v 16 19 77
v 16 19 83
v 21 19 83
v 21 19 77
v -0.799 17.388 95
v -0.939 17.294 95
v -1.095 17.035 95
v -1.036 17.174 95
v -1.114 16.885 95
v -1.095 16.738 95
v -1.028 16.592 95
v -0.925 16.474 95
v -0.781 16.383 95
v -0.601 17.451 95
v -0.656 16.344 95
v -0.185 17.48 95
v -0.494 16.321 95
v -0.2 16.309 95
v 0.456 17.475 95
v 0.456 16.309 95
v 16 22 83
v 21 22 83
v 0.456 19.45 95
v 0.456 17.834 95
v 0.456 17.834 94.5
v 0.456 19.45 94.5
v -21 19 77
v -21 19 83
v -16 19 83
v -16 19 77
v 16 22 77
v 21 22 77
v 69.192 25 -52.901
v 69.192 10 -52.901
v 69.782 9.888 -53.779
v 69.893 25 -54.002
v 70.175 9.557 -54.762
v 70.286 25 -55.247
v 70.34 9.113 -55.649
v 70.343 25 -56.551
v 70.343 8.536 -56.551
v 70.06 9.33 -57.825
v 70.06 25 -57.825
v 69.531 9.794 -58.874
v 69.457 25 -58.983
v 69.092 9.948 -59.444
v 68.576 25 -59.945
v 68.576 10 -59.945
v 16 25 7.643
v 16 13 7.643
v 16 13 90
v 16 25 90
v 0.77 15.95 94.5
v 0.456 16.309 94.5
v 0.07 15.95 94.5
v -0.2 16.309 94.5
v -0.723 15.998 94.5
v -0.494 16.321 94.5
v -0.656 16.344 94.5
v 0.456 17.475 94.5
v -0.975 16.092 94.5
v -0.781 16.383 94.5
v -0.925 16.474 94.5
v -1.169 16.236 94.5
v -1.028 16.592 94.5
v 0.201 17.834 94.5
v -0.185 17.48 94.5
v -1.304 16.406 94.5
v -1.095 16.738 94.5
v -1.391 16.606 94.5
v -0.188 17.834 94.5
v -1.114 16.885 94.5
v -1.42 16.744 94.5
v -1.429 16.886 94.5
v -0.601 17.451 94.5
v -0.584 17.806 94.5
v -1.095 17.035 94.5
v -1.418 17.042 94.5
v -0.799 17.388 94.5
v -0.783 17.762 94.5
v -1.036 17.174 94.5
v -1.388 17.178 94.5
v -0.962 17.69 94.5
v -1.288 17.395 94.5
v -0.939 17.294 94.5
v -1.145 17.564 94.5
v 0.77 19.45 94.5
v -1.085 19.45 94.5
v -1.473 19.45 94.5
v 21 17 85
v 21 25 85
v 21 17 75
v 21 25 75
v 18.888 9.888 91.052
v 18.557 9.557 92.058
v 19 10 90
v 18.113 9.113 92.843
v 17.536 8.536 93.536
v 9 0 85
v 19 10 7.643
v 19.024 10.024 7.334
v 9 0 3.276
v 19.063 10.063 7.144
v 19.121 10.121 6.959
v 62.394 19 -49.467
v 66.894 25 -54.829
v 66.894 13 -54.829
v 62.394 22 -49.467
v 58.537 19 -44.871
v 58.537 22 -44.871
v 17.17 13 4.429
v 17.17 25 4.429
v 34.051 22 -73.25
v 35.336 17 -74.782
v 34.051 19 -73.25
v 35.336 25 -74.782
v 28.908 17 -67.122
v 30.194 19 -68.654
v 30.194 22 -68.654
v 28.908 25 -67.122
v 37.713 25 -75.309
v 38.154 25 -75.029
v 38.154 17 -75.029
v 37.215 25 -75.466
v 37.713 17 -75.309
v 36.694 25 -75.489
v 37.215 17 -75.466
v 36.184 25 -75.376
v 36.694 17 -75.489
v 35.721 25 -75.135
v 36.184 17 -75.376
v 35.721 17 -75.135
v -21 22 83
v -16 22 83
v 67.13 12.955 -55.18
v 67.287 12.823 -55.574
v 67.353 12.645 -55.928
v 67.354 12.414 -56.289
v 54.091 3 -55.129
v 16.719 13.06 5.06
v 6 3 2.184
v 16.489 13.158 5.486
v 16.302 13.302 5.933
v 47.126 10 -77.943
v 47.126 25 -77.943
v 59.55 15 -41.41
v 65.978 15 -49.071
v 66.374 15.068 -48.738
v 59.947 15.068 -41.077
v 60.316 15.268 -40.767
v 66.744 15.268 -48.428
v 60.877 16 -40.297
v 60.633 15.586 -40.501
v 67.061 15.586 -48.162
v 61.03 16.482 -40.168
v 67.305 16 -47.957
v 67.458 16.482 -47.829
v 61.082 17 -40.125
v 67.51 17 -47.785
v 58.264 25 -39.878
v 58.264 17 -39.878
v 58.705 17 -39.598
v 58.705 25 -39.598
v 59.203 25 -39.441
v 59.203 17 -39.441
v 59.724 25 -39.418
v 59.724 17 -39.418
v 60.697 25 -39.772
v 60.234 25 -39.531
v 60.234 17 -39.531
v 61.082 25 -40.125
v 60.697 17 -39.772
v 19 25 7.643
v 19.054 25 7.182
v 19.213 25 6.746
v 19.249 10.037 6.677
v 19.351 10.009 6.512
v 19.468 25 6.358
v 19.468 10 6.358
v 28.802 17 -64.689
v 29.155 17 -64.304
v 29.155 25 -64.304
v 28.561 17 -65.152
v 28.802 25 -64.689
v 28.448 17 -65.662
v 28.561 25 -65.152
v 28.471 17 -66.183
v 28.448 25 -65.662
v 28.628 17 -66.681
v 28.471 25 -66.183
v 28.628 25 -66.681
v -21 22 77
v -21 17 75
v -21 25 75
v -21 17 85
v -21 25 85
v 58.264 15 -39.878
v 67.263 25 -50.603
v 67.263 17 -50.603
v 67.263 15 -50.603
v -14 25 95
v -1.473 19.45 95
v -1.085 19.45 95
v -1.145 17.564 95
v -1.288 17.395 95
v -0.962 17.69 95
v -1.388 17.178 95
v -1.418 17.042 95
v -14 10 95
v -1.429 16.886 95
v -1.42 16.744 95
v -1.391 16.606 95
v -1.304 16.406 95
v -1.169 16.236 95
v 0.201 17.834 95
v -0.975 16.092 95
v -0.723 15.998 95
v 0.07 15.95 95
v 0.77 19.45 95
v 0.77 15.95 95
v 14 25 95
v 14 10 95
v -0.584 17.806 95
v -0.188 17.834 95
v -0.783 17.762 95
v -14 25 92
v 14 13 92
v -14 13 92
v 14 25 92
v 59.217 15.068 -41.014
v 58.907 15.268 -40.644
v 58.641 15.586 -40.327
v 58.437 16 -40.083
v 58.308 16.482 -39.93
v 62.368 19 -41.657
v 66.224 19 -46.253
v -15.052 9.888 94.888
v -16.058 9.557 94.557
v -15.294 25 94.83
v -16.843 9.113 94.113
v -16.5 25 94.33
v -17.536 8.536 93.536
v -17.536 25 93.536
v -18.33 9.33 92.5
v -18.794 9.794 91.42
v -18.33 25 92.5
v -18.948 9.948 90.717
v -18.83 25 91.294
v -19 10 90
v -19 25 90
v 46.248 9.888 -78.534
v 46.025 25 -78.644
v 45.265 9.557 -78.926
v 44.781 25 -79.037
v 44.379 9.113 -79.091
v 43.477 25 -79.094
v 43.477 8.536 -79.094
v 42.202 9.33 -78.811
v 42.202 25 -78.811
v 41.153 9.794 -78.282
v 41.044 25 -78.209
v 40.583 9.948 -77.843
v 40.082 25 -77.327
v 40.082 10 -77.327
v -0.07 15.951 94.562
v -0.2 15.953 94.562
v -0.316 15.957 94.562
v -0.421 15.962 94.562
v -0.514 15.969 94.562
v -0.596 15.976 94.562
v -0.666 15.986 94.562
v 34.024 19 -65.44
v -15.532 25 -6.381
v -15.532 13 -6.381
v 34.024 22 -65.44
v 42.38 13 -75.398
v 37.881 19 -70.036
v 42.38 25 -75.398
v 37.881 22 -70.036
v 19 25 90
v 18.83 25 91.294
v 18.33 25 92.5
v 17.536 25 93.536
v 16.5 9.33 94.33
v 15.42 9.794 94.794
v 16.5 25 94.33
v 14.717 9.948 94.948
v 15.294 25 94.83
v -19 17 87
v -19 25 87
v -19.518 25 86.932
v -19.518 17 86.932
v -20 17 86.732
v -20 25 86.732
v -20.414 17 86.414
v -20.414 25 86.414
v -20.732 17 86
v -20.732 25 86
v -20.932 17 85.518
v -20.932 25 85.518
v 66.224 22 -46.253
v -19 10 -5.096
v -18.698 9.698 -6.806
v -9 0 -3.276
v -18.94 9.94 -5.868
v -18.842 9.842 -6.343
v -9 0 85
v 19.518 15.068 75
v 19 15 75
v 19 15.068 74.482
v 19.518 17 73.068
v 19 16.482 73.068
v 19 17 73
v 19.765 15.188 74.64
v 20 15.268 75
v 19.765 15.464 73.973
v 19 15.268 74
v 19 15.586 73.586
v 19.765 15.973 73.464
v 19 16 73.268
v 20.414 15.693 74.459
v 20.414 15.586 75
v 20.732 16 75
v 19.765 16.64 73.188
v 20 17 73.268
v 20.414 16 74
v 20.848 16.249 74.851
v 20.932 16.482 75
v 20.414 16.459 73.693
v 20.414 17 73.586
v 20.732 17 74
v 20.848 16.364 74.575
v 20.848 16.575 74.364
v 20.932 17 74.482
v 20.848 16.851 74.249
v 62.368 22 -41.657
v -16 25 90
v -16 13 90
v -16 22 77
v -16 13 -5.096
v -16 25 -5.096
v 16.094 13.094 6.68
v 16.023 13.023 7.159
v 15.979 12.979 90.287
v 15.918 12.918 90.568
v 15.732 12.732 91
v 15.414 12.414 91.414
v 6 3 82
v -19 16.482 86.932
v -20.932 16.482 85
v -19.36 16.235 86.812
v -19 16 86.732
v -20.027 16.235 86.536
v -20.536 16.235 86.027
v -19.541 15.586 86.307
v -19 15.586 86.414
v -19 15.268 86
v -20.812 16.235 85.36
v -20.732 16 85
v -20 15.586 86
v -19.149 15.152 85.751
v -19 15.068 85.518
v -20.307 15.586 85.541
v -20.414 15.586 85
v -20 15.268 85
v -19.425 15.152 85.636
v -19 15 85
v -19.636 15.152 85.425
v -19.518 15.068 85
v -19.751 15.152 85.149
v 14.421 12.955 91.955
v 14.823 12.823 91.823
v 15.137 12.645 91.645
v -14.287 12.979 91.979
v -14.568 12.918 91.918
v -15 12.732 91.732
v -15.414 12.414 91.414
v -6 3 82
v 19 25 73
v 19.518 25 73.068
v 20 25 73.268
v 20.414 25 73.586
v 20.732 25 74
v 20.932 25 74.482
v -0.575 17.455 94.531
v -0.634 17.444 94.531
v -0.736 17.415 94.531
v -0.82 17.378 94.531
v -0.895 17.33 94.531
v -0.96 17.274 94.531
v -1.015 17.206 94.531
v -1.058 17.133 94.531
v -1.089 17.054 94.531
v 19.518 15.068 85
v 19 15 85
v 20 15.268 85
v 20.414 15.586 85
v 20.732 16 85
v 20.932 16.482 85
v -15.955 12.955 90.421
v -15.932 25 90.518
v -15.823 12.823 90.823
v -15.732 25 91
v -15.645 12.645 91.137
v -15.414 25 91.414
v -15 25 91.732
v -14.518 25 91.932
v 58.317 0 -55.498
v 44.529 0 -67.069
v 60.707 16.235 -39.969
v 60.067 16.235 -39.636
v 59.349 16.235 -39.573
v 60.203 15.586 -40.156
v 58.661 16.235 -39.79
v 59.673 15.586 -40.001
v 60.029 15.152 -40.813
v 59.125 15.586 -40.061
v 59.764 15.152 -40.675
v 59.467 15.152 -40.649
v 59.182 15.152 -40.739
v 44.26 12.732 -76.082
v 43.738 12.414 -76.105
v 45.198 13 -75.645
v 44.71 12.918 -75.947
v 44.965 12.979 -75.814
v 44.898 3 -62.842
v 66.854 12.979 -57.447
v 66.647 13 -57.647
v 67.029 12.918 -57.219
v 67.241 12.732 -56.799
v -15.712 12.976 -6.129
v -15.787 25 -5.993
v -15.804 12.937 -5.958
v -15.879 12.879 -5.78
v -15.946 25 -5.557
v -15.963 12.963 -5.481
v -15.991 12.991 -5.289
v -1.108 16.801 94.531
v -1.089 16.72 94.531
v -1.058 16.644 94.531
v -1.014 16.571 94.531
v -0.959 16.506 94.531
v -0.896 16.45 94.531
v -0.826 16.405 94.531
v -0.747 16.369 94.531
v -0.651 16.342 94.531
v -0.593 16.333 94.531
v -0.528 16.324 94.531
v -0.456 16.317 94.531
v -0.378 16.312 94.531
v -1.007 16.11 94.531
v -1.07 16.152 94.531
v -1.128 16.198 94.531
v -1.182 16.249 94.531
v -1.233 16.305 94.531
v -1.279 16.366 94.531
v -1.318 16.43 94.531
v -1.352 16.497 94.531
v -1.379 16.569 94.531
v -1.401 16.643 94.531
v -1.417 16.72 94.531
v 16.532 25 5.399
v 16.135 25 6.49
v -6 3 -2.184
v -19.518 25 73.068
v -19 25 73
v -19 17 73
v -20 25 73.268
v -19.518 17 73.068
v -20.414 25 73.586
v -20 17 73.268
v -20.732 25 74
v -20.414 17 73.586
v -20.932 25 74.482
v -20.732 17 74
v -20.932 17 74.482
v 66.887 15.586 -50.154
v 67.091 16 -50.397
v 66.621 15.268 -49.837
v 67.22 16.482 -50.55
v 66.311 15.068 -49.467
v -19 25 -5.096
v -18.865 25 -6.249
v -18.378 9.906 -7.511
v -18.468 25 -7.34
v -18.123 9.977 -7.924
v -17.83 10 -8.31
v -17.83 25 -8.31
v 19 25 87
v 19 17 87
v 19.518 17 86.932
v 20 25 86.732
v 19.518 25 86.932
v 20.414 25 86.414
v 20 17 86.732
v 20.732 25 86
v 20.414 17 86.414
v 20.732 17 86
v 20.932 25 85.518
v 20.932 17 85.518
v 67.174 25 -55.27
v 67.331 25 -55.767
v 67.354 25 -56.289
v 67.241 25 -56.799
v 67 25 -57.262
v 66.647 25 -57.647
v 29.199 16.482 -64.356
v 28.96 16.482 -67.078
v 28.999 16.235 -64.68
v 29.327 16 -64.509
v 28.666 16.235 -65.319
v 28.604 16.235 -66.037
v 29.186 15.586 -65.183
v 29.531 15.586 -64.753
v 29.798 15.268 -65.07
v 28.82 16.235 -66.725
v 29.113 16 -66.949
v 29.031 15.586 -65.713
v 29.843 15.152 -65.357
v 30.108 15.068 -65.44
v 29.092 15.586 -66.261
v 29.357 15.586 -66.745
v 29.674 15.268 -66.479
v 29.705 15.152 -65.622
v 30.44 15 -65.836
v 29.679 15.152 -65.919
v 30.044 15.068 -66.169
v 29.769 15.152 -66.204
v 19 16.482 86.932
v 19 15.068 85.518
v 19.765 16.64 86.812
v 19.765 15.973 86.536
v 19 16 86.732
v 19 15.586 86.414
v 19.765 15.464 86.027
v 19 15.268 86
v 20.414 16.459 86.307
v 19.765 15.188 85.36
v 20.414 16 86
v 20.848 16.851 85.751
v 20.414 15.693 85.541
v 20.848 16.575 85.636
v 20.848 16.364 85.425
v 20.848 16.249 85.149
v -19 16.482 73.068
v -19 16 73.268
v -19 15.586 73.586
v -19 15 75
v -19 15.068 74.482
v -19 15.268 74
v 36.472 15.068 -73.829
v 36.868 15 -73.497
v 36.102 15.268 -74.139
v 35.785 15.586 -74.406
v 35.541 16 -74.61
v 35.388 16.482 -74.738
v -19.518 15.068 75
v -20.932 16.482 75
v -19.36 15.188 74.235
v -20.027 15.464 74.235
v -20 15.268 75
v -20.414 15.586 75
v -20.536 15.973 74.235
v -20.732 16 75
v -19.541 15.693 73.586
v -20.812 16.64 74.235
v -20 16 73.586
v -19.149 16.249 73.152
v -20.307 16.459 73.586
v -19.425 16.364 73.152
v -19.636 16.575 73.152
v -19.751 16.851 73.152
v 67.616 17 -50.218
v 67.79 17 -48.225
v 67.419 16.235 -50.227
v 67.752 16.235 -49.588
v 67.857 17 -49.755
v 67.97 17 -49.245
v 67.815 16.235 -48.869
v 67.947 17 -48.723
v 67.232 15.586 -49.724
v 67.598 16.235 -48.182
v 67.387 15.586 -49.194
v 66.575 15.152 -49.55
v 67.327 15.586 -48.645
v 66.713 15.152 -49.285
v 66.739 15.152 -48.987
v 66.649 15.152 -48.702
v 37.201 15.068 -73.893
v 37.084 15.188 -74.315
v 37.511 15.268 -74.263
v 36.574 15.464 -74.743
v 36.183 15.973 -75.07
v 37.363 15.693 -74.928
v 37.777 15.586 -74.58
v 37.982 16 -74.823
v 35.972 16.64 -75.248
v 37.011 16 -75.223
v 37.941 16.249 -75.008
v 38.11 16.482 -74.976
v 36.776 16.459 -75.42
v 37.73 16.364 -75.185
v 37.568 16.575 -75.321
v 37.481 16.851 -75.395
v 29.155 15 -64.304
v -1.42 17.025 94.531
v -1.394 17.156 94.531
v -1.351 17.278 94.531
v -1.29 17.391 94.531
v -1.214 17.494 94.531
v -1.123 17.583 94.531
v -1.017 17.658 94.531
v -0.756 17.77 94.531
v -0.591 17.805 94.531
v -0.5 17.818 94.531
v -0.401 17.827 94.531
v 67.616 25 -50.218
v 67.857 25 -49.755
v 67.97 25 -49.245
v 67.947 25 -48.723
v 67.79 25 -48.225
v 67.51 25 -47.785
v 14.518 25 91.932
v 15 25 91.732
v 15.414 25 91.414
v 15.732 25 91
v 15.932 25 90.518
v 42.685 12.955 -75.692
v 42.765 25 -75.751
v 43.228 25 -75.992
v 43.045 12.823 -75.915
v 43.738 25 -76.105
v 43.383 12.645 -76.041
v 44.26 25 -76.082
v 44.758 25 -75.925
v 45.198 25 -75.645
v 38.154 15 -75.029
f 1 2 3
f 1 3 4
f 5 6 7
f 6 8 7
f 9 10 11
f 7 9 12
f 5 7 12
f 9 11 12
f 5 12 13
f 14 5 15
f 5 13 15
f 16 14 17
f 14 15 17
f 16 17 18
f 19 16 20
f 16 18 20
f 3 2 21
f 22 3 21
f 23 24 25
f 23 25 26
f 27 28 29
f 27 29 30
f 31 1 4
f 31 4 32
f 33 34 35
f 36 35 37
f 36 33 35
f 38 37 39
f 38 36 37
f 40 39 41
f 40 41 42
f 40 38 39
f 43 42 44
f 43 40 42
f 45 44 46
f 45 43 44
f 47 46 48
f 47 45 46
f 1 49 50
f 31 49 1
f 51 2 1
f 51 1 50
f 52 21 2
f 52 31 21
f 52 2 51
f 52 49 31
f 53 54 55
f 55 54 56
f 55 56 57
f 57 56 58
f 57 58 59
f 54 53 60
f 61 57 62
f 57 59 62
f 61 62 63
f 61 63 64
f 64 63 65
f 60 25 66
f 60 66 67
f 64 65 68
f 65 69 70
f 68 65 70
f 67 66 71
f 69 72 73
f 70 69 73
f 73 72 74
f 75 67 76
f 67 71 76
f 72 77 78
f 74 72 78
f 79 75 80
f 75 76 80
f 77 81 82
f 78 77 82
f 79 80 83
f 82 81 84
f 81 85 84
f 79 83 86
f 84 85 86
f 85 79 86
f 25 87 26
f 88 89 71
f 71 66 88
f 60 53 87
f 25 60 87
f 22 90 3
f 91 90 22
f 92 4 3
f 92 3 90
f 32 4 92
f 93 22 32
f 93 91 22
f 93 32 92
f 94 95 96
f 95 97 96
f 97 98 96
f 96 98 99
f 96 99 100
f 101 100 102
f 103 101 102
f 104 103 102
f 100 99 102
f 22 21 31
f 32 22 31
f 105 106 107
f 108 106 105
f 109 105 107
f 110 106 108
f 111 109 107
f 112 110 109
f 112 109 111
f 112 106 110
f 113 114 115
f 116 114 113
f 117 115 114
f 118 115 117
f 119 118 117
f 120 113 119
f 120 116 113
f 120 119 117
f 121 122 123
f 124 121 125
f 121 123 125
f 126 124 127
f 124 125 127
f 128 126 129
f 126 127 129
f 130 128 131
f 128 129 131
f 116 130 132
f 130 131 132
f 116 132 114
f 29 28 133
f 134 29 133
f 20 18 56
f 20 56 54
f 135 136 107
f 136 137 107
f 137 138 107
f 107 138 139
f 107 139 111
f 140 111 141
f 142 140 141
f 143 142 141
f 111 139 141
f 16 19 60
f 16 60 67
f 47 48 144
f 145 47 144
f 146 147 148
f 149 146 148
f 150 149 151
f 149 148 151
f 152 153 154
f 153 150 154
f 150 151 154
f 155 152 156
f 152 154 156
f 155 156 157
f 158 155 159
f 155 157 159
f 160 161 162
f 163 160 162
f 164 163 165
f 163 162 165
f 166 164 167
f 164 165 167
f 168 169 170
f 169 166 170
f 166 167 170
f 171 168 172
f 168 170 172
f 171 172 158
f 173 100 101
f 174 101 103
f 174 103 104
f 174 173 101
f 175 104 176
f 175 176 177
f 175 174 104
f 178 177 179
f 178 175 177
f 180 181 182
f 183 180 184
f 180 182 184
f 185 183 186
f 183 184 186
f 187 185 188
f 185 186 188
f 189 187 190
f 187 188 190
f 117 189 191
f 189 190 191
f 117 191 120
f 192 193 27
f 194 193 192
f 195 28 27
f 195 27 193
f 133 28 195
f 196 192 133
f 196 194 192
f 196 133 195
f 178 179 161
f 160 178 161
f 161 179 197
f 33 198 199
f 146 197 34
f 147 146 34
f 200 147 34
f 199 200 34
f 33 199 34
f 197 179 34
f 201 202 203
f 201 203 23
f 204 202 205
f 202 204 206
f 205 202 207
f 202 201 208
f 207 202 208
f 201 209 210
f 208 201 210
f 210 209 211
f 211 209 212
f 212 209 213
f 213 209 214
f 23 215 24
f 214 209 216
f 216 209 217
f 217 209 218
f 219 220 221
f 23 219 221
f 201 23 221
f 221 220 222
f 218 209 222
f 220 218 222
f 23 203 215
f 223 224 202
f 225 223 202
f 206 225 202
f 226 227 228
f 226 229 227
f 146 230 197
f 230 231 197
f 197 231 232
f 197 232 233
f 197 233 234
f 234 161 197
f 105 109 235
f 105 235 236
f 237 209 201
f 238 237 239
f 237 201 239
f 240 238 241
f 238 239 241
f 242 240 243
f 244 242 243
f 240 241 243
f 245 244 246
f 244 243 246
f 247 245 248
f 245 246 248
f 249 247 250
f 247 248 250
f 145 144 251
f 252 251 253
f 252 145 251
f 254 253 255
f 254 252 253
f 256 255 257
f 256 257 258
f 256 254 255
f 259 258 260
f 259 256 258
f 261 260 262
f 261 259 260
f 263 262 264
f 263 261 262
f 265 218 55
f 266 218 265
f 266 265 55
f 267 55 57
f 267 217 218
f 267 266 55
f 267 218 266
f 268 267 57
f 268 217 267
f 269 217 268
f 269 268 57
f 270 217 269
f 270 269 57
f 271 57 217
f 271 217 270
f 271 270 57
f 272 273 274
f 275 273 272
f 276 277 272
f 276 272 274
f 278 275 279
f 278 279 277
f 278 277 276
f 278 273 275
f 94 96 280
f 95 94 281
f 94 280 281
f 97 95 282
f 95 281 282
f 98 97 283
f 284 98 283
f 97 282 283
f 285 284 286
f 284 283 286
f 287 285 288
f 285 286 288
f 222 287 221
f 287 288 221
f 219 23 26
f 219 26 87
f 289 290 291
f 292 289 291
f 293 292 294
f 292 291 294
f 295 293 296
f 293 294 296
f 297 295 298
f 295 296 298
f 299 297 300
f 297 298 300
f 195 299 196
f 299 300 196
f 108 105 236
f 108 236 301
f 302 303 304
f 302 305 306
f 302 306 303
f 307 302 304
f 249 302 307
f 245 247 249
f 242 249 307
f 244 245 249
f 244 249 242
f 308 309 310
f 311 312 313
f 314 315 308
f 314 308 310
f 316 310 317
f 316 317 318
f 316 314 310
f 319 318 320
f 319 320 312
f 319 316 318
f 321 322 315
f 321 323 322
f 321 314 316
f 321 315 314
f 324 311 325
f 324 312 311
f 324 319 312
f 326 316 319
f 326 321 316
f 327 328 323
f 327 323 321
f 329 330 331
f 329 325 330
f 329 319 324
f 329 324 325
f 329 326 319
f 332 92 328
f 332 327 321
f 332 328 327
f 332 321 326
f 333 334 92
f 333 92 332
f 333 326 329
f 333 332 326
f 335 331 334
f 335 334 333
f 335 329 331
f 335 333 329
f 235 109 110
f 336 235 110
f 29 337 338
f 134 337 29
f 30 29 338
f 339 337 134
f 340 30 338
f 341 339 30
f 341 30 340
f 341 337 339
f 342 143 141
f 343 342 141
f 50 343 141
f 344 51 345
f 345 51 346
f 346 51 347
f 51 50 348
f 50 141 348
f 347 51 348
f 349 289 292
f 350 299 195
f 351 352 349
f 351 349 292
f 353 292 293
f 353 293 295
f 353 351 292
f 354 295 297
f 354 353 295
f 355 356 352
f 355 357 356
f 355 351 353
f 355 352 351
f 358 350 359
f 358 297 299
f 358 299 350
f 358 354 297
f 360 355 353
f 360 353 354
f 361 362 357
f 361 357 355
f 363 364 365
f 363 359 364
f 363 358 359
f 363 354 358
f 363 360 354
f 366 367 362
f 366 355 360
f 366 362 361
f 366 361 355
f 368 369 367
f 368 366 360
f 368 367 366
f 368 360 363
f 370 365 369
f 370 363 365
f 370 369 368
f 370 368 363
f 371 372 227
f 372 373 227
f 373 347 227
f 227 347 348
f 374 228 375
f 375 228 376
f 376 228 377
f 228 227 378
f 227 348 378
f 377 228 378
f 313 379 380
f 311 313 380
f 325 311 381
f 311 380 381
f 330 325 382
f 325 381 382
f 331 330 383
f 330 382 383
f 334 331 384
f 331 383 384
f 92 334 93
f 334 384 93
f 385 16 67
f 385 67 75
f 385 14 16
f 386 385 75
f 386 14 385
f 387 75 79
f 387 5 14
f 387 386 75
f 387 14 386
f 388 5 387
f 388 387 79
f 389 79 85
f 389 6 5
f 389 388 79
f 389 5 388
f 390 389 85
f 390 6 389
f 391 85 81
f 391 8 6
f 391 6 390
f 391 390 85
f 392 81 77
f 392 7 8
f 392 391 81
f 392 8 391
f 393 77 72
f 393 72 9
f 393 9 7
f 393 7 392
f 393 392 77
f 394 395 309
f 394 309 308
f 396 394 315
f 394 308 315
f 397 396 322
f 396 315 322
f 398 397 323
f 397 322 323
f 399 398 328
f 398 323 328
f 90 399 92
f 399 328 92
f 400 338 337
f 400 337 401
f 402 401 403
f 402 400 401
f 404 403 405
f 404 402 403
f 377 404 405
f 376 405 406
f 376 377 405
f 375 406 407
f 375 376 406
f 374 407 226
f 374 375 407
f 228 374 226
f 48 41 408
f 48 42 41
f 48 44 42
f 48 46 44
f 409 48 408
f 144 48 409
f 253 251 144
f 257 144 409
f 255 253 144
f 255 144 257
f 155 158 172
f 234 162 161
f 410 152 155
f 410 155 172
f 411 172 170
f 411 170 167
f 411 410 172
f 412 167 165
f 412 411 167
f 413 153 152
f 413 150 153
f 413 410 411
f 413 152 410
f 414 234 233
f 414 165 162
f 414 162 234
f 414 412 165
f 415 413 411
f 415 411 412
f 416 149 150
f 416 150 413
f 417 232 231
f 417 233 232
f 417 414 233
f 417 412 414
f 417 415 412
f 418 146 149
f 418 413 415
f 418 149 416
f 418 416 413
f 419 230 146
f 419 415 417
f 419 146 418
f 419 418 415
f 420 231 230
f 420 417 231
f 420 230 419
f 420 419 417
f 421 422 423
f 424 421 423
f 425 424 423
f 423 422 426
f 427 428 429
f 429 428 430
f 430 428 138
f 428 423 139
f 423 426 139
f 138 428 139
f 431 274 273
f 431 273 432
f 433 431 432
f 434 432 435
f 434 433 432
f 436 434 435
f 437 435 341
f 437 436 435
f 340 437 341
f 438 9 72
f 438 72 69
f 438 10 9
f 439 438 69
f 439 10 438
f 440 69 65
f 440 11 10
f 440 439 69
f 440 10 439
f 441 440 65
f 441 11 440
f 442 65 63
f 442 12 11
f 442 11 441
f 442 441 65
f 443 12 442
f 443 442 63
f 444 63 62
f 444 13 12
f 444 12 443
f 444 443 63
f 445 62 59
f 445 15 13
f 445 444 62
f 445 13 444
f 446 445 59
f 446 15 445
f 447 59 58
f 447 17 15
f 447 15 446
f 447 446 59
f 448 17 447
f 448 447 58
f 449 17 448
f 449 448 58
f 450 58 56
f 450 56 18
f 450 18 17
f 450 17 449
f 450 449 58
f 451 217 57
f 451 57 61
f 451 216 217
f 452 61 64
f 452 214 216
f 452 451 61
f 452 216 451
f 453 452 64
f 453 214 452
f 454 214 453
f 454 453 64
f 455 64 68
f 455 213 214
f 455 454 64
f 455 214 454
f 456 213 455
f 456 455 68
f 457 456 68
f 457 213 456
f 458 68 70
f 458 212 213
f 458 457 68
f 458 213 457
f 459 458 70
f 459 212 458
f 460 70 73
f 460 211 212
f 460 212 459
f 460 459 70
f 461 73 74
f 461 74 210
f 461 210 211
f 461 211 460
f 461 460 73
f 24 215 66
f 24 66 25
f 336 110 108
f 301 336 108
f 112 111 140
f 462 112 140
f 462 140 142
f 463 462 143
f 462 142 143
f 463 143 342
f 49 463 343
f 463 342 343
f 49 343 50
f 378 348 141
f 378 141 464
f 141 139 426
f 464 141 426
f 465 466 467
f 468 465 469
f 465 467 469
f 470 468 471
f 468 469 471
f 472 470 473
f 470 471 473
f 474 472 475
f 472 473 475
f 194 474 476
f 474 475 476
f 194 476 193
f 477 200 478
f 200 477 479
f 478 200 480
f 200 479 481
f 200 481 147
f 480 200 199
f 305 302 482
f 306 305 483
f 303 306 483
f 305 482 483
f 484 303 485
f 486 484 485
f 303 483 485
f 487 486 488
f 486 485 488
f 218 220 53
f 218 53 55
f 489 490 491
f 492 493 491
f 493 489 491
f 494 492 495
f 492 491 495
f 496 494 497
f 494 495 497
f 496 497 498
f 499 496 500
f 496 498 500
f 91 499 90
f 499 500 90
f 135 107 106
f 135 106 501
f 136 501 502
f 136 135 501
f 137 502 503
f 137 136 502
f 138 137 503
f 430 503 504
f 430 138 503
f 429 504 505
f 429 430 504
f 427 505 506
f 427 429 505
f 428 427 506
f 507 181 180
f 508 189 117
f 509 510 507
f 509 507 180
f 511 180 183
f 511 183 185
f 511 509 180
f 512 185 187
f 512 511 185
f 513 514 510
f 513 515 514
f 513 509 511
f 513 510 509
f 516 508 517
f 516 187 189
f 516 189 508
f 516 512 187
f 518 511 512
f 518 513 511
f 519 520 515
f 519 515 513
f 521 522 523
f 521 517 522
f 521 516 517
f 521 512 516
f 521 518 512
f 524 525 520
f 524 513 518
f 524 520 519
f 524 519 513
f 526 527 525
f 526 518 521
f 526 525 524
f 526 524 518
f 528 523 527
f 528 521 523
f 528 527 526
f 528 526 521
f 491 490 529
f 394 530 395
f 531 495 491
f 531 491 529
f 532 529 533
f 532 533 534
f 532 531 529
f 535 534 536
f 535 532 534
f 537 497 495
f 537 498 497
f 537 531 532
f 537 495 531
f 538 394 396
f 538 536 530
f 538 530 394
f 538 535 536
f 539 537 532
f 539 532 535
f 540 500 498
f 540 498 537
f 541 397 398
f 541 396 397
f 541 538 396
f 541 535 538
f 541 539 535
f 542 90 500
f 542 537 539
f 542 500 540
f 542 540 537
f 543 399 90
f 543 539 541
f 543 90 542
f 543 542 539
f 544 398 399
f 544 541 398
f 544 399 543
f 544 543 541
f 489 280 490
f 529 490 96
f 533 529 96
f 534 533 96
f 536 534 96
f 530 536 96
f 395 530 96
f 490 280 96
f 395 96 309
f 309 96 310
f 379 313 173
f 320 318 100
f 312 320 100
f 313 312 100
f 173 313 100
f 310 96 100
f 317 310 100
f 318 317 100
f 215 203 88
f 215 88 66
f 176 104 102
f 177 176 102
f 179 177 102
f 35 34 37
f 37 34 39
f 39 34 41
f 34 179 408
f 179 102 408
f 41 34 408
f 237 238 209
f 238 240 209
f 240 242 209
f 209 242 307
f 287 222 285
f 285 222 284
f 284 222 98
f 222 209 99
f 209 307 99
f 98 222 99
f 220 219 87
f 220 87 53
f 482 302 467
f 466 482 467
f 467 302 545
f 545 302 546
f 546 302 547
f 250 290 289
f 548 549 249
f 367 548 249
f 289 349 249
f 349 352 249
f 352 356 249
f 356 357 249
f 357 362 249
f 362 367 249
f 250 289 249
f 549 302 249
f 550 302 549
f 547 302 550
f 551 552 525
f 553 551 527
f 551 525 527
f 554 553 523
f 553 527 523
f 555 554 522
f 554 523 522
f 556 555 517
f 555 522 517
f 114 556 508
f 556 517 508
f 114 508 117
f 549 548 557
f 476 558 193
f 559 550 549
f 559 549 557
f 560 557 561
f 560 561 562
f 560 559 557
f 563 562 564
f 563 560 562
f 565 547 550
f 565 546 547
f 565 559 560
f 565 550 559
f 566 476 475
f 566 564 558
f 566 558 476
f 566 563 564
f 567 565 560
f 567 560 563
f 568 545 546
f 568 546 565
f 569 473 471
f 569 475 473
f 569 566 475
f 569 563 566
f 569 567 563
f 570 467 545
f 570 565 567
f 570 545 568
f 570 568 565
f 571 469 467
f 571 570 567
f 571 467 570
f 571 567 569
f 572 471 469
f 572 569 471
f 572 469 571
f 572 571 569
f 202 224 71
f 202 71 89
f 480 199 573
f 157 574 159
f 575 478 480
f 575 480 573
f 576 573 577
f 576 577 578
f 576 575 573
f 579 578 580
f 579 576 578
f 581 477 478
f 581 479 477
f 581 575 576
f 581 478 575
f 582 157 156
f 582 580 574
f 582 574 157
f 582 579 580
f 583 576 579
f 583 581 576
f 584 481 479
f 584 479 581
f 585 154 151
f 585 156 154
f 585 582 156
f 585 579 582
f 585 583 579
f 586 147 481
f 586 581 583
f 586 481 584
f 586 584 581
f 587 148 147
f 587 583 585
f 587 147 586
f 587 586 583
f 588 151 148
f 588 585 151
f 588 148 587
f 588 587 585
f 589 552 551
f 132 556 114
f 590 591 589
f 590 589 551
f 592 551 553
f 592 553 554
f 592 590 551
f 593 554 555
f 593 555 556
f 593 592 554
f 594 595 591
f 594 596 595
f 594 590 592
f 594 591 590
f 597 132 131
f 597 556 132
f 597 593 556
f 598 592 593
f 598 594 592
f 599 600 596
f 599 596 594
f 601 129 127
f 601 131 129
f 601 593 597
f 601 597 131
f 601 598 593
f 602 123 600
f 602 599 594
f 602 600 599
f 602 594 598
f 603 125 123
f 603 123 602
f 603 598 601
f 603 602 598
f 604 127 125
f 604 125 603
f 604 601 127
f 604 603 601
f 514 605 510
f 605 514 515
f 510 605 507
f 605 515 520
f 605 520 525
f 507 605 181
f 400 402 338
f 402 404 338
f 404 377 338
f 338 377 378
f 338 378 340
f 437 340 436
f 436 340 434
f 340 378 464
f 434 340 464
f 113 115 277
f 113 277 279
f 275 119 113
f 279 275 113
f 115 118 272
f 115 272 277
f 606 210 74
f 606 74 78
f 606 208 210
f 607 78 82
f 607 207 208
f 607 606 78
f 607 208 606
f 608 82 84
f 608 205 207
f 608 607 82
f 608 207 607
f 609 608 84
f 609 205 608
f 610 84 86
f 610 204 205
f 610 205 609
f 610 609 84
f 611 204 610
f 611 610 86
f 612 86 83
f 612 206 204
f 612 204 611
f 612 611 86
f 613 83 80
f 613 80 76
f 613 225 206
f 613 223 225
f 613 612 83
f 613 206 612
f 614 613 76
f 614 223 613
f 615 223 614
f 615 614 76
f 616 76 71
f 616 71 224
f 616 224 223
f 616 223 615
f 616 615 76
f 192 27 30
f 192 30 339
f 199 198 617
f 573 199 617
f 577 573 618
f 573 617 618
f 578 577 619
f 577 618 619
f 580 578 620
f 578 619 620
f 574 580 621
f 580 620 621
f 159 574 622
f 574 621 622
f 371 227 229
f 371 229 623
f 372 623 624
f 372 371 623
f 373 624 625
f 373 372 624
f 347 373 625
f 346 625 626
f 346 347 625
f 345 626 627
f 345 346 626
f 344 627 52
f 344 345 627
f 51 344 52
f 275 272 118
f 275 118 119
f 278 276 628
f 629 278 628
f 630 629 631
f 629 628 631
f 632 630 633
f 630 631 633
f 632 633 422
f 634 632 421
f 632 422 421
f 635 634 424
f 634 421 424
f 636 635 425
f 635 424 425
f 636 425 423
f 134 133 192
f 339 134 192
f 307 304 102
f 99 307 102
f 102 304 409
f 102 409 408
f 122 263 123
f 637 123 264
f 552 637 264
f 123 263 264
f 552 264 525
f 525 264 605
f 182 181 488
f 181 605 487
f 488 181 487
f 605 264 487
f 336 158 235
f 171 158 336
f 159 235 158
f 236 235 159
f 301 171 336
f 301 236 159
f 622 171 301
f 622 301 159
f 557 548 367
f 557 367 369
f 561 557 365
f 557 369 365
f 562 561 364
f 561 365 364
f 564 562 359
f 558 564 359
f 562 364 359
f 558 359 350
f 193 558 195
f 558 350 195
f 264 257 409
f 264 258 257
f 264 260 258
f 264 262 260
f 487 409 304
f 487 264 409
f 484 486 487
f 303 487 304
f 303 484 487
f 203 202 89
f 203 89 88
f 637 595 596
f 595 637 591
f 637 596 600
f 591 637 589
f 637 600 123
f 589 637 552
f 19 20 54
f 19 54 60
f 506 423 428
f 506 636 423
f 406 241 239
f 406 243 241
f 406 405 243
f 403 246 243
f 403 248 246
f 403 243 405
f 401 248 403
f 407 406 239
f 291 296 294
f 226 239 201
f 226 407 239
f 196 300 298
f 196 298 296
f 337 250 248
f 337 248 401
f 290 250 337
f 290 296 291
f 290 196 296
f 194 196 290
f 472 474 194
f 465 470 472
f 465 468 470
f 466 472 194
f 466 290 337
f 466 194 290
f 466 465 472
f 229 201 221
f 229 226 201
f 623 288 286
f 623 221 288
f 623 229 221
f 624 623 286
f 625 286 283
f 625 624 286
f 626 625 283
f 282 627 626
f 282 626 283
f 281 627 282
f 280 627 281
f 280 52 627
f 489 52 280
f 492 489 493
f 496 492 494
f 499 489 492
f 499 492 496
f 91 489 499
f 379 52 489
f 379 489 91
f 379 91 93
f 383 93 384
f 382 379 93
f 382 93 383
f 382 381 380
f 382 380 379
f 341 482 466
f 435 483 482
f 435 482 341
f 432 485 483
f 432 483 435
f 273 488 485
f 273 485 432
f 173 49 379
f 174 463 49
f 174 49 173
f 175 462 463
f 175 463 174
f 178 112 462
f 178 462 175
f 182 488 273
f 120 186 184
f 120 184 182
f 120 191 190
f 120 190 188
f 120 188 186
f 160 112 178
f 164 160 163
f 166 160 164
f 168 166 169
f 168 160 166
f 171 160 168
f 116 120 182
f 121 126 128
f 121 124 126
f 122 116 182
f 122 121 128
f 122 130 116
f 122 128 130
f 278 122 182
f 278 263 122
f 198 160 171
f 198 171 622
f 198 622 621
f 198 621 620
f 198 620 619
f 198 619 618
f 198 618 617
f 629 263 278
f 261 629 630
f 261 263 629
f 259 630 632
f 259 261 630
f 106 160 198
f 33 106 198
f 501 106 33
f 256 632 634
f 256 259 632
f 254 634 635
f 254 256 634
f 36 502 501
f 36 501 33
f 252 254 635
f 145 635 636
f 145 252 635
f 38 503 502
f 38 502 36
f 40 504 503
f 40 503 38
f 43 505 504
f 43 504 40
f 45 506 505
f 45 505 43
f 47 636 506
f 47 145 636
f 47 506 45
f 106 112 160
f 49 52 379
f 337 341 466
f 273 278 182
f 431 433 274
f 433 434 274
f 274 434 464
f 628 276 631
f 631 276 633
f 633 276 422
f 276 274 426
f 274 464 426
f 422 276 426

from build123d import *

# Parameters (mm, degrees)
BOSS_EXTRUDE1_DEPTH     = 25
CUT_EXTRUDE1_DEPTH      = 22
CHAMFER1_SIZE           = 10
FILLET1_R               = 2
FILLET2_R               = 5
SKETCH3_W               = 14
SKETCH3_H               = 10
BOSS_EXTRUDE2_DEPTH     = 2
SKETCH4_W               = 14
SKETCH4_H               = 10
BOSS_EXTRUDE3_DEPTH     = 2
CUT_EXTRUDE2_DEPTH      = 111.216138206
CUT_EXTRUDE2_DEPTH_BACK = 111.216138206
SKETCH5_W               = 6
SKETCH5_H               = 3
SKETCH6_W               = 14
SKETCH6_H               = 10
BOSS_EXTRUDE4_DEPTH     = 2
SKETCH7_W               = 14
SKETCH7_H               = 10
BOSS_EXTRUDE5_DEPTH     = 2
CUT_EXTRUDE3_DEPTH      = 110.938912569
CUT_EXTRUDE3_DEPTH_BACK = 110.938912569
SKETCH8_W               = 6
SKETCH8_H               = 3
FILLET4_R               = 2
CUT_EXTRUDE4_DEPTH      = 0.5


with BuildPart() as part:
    # Sketch1 → Boss-Extrude1 (new body)
    with BuildSketch(Plane(origin=(0, 0, 0), x_dir=(1, 0, 0), z_dir=(0, 1, 0))):
        Polygon((19, -95), (19, -6.915434451), (72.405729291, 56.731035297), (43.296040453, 81.156964465), (-19, 6.915434451), (-19, -95), align=None)
    extrude(amount=BOSS_EXTRUDE1_DEPTH)

    # Sketch2 → Cut-Extrude1 (cut)
    with BuildSketch(Plane(origin=(0, 25, 0), x_dir=(1, 0, 0), z_dir=(0, 1, 0))):
        Polygon((43.665810953, 76.930468306), (68.179233133, 56.361264796), (16, -5.823523748), (16, -92), (-16, -92), (-16, 5.823523748), align=None)
    extrude(amount=-CUT_EXTRUDE1_DEPTH, mode=Mode.SUBTRACT)

    # Chamfer1
    chamfer1_edges = [part.edges().sort_by_distance(p)[0] for p in [
        (13.832905476, 3, -41.376996027),
        (55.922522043, 3, -66.645866551),
        (42.089616566, 3, -25.268870524),
        (16, 3, 48.911761874),
        (0, 3, 92),
        (-16, 3, 43.088238126),
        (-19, 0, 44.042282774),
        (12.148020226, 0, -44.036199458),
        (57.850884872, 0, -68.943999881),
        (45.702864646, 0, -24.907800423),
        (19, 0, 50.957717226),
        (0, 0, 95),
    ]]
    chamfer(chamfer1_edges, length=CHAMFER1_SIZE)

    # Fillet1
    fillet1_edges = [part.edges().sort_by_distance(p)[0] for p in [
        (19, 17.5, 6.915434451),
        (43.665810953, 19, -76.930468306),
        (68.179233133, 19, -56.361264796),
        (16, 19, 92),
        (-16, 19, 92),
        (-16, 19, -5.823523748),
    ]]
    fillet(fillet1_edges, radius=FILLET1_R)

    # Fillet2
    fillet2_edges = [part.edges().sort_by_distance(p)[0] for p in [
        (-19, 17.5, 95),
        (-19, 17.5, -6.915434451),
        (43.296040453, 17.5, -81.156964465),
        (72.405729291, 17.5, -56.731035297),
        (19, 17.5, 95),
        (16, 19, 5.823523748),
    ]]
    fillet(fillet2_edges, radius=FILLET2_R)

    # Sketch3 → Boss-Extrude2 (add)
    with BuildSketch(Plane(origin=(-14.554844419, 0, -12.212964584), x_dir=(-0.6427876096865406, 0, 0.7660444431189771), z_dir=(-0.766044443118977, 0, -0.6427876096865405))):
        with Locations((-75, 20)):
            Rectangle(SKETCH3_W, SKETCH3_H)
    extrude(amount=BOSS_EXTRUDE2_DEPTH)

    # Sketch4 → Boss-Extrude3 (add)
    with BuildSketch(Plane(origin=(14.554844419, 0, 12.212964584), x_dir=(0.6427876096865404, 0, -0.7660444431189771), z_dir=(0.7660444431189771, 0, 0.6427876096865404))):
        with Locations((75, 20)):
            Rectangle(SKETCH4_W, SKETCH4_H)
    extrude(amount=BOSS_EXTRUDE3_DEPTH)

    # Sketch5 → Cut-Extrude2 (cut, two sides: drawn at the far end of the back side and taken through both)
    with BuildSketch(Plane(origin=(16.086933305, 0, 13.498539803), x_dir=(0.64278760968654, 0, -0.7660444431189776), z_dir=(0.7660444431189775, 0, 0.6427876096865399)).offset(-CUT_EXTRUDE2_DEPTH_BACK)):
        with Locations((75, 20.5)):
            Rectangle(SKETCH5_W, SKETCH5_H)
    extrude(amount=CUT_EXTRUDE2_DEPTH + CUT_EXTRUDE2_DEPTH_BACK, mode=Mode.SUBTRACT)

    # Sketch6 → Boss-Extrude4 (add)
    with BuildSketch(Plane.ZY.offset(19)):
        with Locations((80, 20)):
            Rectangle(SKETCH6_W, SKETCH6_H)
    extrude(amount=BOSS_EXTRUDE4_DEPTH)

    # Sketch7 → Boss-Extrude5 (add)
    with BuildSketch(Plane(origin=(19, 0, 0), x_dir=(0, 0, -1), z_dir=(1, 0, 0))):
        with Locations((-80, 20)):
            Rectangle(SKETCH7_W, SKETCH7_H)
    extrude(amount=BOSS_EXTRUDE5_DEPTH)

    # Sketch8 → Cut-Extrude3 (cut, two sides: drawn at the far end of the back side and taken through both)
    with BuildSketch(Plane(origin=(21, 0, 0), x_dir=(0, 0, -1), z_dir=(1, 0, 0)).offset(-CUT_EXTRUDE3_DEPTH_BACK)):
        with Locations((-80, 20.5)):
            Rectangle(SKETCH8_W, SKETCH8_H)
    extrude(amount=CUT_EXTRUDE3_DEPTH + CUT_EXTRUDE3_DEPTH_BACK, mode=Mode.SUBTRACT)

    # Fillet4
    # the kernel refuses this fillet: 2 mm, written as the material it takes off along each edge
    with BuildSketch(Plane(origin=(36.868164356, 17, -73.496520034), x_dir=(-0.7660444431189771, 0, -0.6427876096865406), z_dir=(0.6427876096865406, 0, -0.7660444431189771))) as fillet4_piece_1_section:
        Polygon((0, 0), (FILLET4_R * 1.02, 0), (FILLET4_R * 1.02, -FILLET4_R * 1.02), (0, -FILLET4_R * 1.02), align=None)
    fillet4_piece_1 = extrude(amount=FILLET4_R * 1.02, mode=Mode.PRIVATE)
    fillet4_piece_1 = fillet4_piece_1 - Plane(origin=(36.868164356, 17, -73.496520034), x_dir=(0.5416752204197013, 0.7071067811865475, 0.4545194776720445), z_dir=(0.6427876096865406, 0, -0.7660444431189771)) * Sphere(FILLET4_R, mode=Mode.PRIVATE)
    add(fillet4_piece_1, mode=Mode.SUBTRACT)
    with BuildSketch(Plane(origin=(30.440288259, 17, -65.836075602), x_dir=(-0.7660444431189771, 0, -0.6427876096865406), z_dir=(0, -1, 0))) as fillet4_piece_2_section:
        Polygon((0, 0), (FILLET4_R * 1.02, 0), (FILLET4_R * 1.02, -FILLET4_R * 1.02), (0, -FILLET4_R * 1.02), align=None)
    fillet4_piece_2 = extrude(amount=FILLET4_R * 1.02, mode=Mode.PRIVATE)
    fillet4_piece_2 = fillet4_piece_2 - Plane(origin=(30.440288259, 17, -65.836075602), x_dir=(0.9961946980917457, -1.0048591735576166e-15, -0.08715574274765664), z_dir=(0, -1, 0)) * Sphere(FILLET4_R, mode=Mode.PRIVATE)
    add(fillet4_piece_2, mode=Mode.SUBTRACT)
    with BuildSketch(Plane(origin=(59.549977097, 17, -41.410146434), x_dir=(-0.6427876096865404, 0, 0.7660444431189771), z_dir=(0, -1, 0))) as fillet4_piece_3_section:
        Polygon((0, 0), (FILLET4_R * 1.02, 0), (FILLET4_R * 1.02, -FILLET4_R * 1.02), (0, -FILLET4_R * 1.02), align=None)
    fillet4_piece_3 = extrude(amount=FILLET4_R * 1.02, mode=Mode.PRIVATE)
    fillet4_piece_3 = fillet4_piece_3 - Plane(origin=(59.549977097, 17, -41.410146434), x_dir=(-0.08715574274765679, 0, -0.9961946980917457), z_dir=(0, -1, 0)) * Sphere(FILLET4_R, mode=Mode.PRIVATE)
    add(fillet4_piece_3, mode=Mode.SUBTRACT)
    with BuildSketch(Plane(origin=(65.977853194, 17, -49.070590865), x_dir=(0.7660444431189771, 0, 0.6427876096865404), z_dir=(0, -1, 0))) as fillet4_piece_4_section:
        Polygon((0, 0), (FILLET4_R * 1.02, 0), (FILLET4_R * 1.02, -FILLET4_R * 1.02), (0, -FILLET4_R * 1.02), align=None)
    fillet4_piece_4 = extrude(amount=FILLET4_R * 1.02, mode=Mode.PRIVATE)
    fillet4_piece_4 = fillet4_piece_4 - Plane(origin=(65.977853194, 17, -49.070590865), x_dir=(-0.9961946980917457, 0, 0.08715574274765679), z_dir=(0, -1, 0)) * Sphere(FILLET4_R, mode=Mode.PRIVATE)
    add(fillet4_piece_4, mode=Mode.SUBTRACT)
    with BuildSketch(Plane(origin=(-19, 17, 75), x_dir=(-1, 0, 0), z_dir=(0, 0, -1))) as fillet4_piece_5_section:
        Polygon((0, 0), (FILLET4_R * 1.02, 0), (FILLET4_R * 1.02, -FILLET4_R * 1.02), (0, -FILLET4_R * 1.02), align=None)
    fillet4_piece_5 = extrude(amount=FILLET4_R * 1.02, mode=Mode.PRIVATE)
    fillet4_piece_5 = fillet4_piece_5 - Plane(origin=(-19, 17, 75), x_dir=(0.7071067811865475, 0.7071067811865475, 0), z_dir=(0, 0, -1)) * Sphere(FILLET4_R, mode=Mode.PRIVATE)
    add(fillet4_piece_5, mode=Mode.SUBTRACT)
    with BuildSketch(Plane(origin=(-19, 17, 85), x_dir=(-1, 0, 0), z_dir=(0, -1, 0))) as fillet4_piece_6_section:
        Polygon((0, 0), (FILLET4_R * 1.02, 0), (FILLET4_R * 1.02, -FILLET4_R * 1.02), (0, -FILLET4_R * 1.02), align=None)
    fillet4_piece_6 = extrude(amount=FILLET4_R * 1.02, mode=Mode.PRIVATE)
    fillet4_piece_6 = fillet4_piece_6 - Plane(origin=(-19, 17, 85), x_dir=(0.7071067811865475, 0, -0.7071067811865475), z_dir=(0, -1, 0)) * Sphere(FILLET4_R, mode=Mode.PRIVATE)
    add(fillet4_piece_6, mode=Mode.SUBTRACT)
    with BuildSketch(Plane(origin=(19, 17, 85), x_dir=(0, -1, 0), z_dir=(1, 0, 0))) as fillet4_piece_7_section:
        Polygon((0, 0), (FILLET4_R * 1.02, 0), (FILLET4_R * 1.02, -FILLET4_R * 1.02), (0, -FILLET4_R * 1.02), align=None)
    fillet4_piece_7 = extrude(amount=FILLET4_R * 1.02, mode=Mode.PRIVATE)
    fillet4_piece_7 = fillet4_piece_7 - Plane(origin=(19, 17, 85), x_dir=(0, 0.7071067811865476, -0.7071067811865475), z_dir=(1, 0, 0)) * Sphere(FILLET4_R, mode=Mode.PRIVATE)
    add(fillet4_piece_7, mode=Mode.SUBTRACT)
    with BuildSketch(Plane(origin=(19, 17, 75), x_dir=(0, 0, -1), z_dir=(1, 0, 0))) as fillet4_piece_8_section:
        Polygon((0, 0), (FILLET4_R * 1.02, 0), (FILLET4_R * 1.02, -FILLET4_R * 1.02), (0, -FILLET4_R * 1.02), align=None)
    fillet4_piece_8 = extrude(amount=FILLET4_R * 1.02, mode=Mode.PRIVATE)
    fillet4_piece_8 = fillet4_piece_8 - Plane(origin=(19, 17, 75), x_dir=(0, 0.7071067811865475, 0.7071067811865477), z_dir=(1, 0, 0)) * Sphere(FILLET4_R, mode=Mode.PRIVATE)
    add(fillet4_piece_8, mode=Mode.SUBTRACT)
    with BuildSketch(Plane(origin=(36.621650689, 17, -76.314184139), x_dir=(0.7660444431189815, 0, 0.6427876096865355), z_dir=(0, 1, 0)), Plane(origin=(59.796490764, 17, -38.592482329), x_dir=(-0.7660444431189785, 0, -0.6427876096865388), z_dir=(0, 1, 0)), Plane(origin=(-21, 17, 73), x_dir=(1, 0, 0), z_dir=(0, 1, 0)), Plane(origin=(21, 17, 87), x_dir=(-1, 0, 0), z_dir=(0, 1, 0)), Plane(origin=(21, 30, 73), x_dir=(-1, 0, 0), z_dir=(0, -1, 0))) as fillet4_piece_9:
        with BuildLine():
            CenterArc((FILLET4_R, -FILLET4_R), FILLET4_R, 90, 90)
            Line((0, -FILLET4_R), (0, 0))
            Line((0, 0), (FILLET4_R, 0))
        make_face()
    extrude(amount=13, mode=Mode.SUBTRACT)
    with BuildSketch(Plane(origin=(28.908199373, 15, -67.121650822), x_dir=(0, 1, 0), z_dir=(0.6427876096865406, 0, -0.7660444431189771)), Plane(origin=(67.50994208, 15, -47.785015646), x_dir=(0, 1, 0), z_dir=(-0.6427876096865404, 0, 0.7660444431189771)), Plane(origin=(-21, 15, 85), x_dir=(0, 1, 0), z_dir=(0, 0, -1))) as fillet4_piece_10:
        with BuildLine():
            CenterArc((FILLET4_R, FILLET4_R), FILLET4_R, 180, 90)
            Line((0, FILLET4_R), (0, 0))
            Line((0, 0), (FILLET4_R, 0))
        make_face()
    extrude(amount=10, mode=Mode.SUBTRACT)
    with BuildSketch(Plane(origin=(27.622624153, 30, -65.589561936), x_dir=(0.6427876096865434, -1.4210854715202012e-15, -0.7660444431189747), z_dir=(0, -1, 0)), Plane(origin=(68.7955173, 30, -49.317104532), x_dir=(-0.6427876096865396, 0, 0.7660444431189779), z_dir=(0, -1, 0)), Plane(origin=(-21, 30, 87), x_dir=(0, 0, -1), z_dir=(0, -1, 0))) as fillet4_piece_11:
        with BuildLine():
            CenterArc((FILLET4_R, FILLET4_R), FILLET4_R, 180, 90)
            Line((0, FILLET4_R), (0, 0))
            Line((0, 0), (FILLET4_R, 0))
        make_face()
    extrude(amount=13, mode=Mode.SUBTRACT)
    with BuildSketch(Plane(origin=(21, 15, 75), x_dir=(-1, 0, 0), z_dir=(0, 0, 1))) as fillet4_piece_12:
        with BuildLine():
            CenterArc((FILLET4_R, -FILLET4_R), FILLET4_R, 90, 90)
            Line((0, -FILLET4_R), (0, 0))
            Line((0, 0), (FILLET4_R, 0))
        make_face()
    extrude(amount=10, mode=Mode.SUBTRACT)

    # Sketch9 → Cut-Extrude4 (cut)
    with BuildSketch(Plane.XY.offset(95)):
        with BuildLine():
            Line((0.770149808, 15.949853493), (0.069729135, 15.949853493))
            add(Edge.make_bspline(
                [(0.069729135, 15.949853493), (0.022988006, 15.950009079), (-0.066760138, 15.950307821), (-0.195333409, 15.951973584), (-0.312160506, 15.95674794), (-0.417180345, 15.960856524), (-0.510391, 15.968348465), (-0.592078291, 15.975509112), (-0.661865988, 15.984882773), (-0.704111839, 15.993588196), (-0.723239615, 15.997529775)],
                knots=[0, 0, 0, 0, 1.410062039, 2.707475311, 3.878576406, 4.937260626, 5.877586885, 6.699081471, 7.410979367, 8, 8, 8, 8], degree=3))
            add(Edge.make_bspline(
                [(-0.723239615, 15.997529775), (-0.748846671, 16.00385584), (-0.799514513, 16.016373018), (-0.872458324, 16.042842782), (-0.941995725, 16.07342491), (-1.007872068, 16.109619108), (-1.07007009, 16.150814191), (-1.128583525, 16.197175766), (-1.182627824, 16.249101056), (-1.234125799, 16.304439111), (-1.279093367, 16.365599283), (-1.319576108, 16.429477854), (-1.353559982, 16.497304646), (-1.380301499, 16.568737557), (-1.402719695, 16.643075866), (-1.417786816, 16.721054136), (-1.427170882, 16.802418665), (-1.428098028, 16.857779951), (-1.428568141, 16.885851089)],
                knots=[0, 0, 0, 0, 1.027276577, 2.032638556, 3.019345632, 3.985365262, 4.957888996, 5.923693931, 6.890056973, 7.876427719, 8.865527834, 9.843495157, 10.821038291, 11.815616373, 12.812734995, 13.843357168, 14.906466538, 16, 16, 16, 16], degree=3))
            add(Edge.make_bspline(
                [(-1.428568141, 16.885851089), (-1.427099181, 16.932486248), (-1.42423286, 17.02348352), (-1.397507223, 17.155543652), (-1.353732651, 17.278735708), (-1.293402188, 17.392888247), (-1.216609264, 17.495836267), (-1.124321632, 17.585953039), (-1.017010598, 17.662060759), (-0.916642043, 17.714277362), (-0.827939659, 17.747875763), (-0.754699989, 17.771634396), (-0.674747225, 17.789681372), (-0.589228411, 17.806083553), (-0.497482991, 17.818599734), (-0.399695717, 17.827488601), (-0.295622018, 17.833204211), (-0.224282256, 17.834039286), (-0.187582564, 17.834468878)],
                knots=[0, 0, 0, 0, 1.260402266, 2.459371274, 3.627181936, 4.786749125, 5.93865593, 7.087644312, 8.261344208, 9.485713728, 10.136162886, 10.825977872, 11.566646758, 12.35154167, 13.181268117, 14.0701832, 15.007234106, 16, 16, 16, 16], degree=3))
            Line((-0.187582564, 17.834468878), (-1.473439936, 19.449853493))
            Line((-1.473439936, 19.449853493), (-1.085018462, 19.449853493))
            Line((-1.085018462, 19.449853493), (0.20083891, 17.834468878))
            Line((0.20083891, 17.834468878), (0.456047244, 17.834468878))
            Line((0.456047244, 17.834468878), (0.456047244, 19.449853493))
            Line((0.456047244, 19.449853493), (0.770149808, 19.449853493))
            Line((0.770149808, 19.449853493), (0.770149808, 15.949853493))
        make_face()
        with BuildLine():
            Line((0.456047244, 16.308827852), (0.456047244, 17.475494519))
            Line((0.456047244, 17.475494519), (-0.184778077, 17.480402371))
            add(Edge.make_bspline(
                [(-0.184778077, 17.480402371), (-0.21469812, 17.480415616), (-0.272691684, 17.480441287), (-0.356592298, 17.476447408), (-0.434712583, 17.471904439), (-0.506752755, 17.464953926), (-0.572748236, 17.456001693), (-0.632655435, 17.444786189), (-0.686606738, 17.431774923), (-0.749329379, 17.411430804), (-0.820174706, 17.380589004), (-0.895580027, 17.332766113), (-0.96151982, 17.274931374), (-1.016341478, 17.20796185), (-1.060374295, 17.134013656), (-1.090959009, 17.054760347), (-1.111114158, 16.971450639), (-1.113335557, 16.914248523), (-1.114465577, 16.885149968)],
                knots=[0, 0, 0, 0, 1.146399208, 2.222048177, 3.218135709, 4.144938032, 4.994811973, 5.769438708, 6.479732432, 7.119818093, 8.294689872, 9.430121864, 10.527913442, 11.641375077, 12.733452768, 13.811150417, 14.886538365, 16, 16, 16, 16], degree=3))
            add(Edge.make_bspline(
                [(-1.114465577, 16.885149968), (-1.11327834, 16.856997889), (-1.11092567, 16.801210743), (-1.091279923, 16.719723609), (-1.059201529, 16.642240041), (-1.015294441, 16.569826261), (-0.960647361, 16.504580422), (-0.89699582, 16.448925629), (-0.825837681, 16.402689213), (-0.759869456, 16.372182313), (-0.700474821, 16.354232006), (-0.64914328, 16.341201897), (-0.590637341, 16.3320762), (-0.525645612, 16.323682996), (-0.453882588, 16.316575239), (-0.375304538, 16.311857459), (-0.289967646, 16.309037635), (-0.230820731, 16.308899407), (-0.200202756, 16.308827852)],
                knots=[0, 0, 0, 0, 1.100596872, 2.180981401, 3.259506136, 4.371595435, 5.481727359, 6.576991111, 7.667816242, 8.793363246, 9.406619729, 10.09427138, 10.864108636, 11.721733836, 12.6590937, 13.685439239, 14.801845161, 16, 16, 16, 16], degree=3))
            Line((-0.200202756, 16.308827852), (0.456047244, 16.308827852))
        make_face(mode=Mode.SUBTRACT)
    extrude(amount=-CUT_EXTRUDE4_DEPTH, mode=Mode.SUBTRACT)


solid = part.part
